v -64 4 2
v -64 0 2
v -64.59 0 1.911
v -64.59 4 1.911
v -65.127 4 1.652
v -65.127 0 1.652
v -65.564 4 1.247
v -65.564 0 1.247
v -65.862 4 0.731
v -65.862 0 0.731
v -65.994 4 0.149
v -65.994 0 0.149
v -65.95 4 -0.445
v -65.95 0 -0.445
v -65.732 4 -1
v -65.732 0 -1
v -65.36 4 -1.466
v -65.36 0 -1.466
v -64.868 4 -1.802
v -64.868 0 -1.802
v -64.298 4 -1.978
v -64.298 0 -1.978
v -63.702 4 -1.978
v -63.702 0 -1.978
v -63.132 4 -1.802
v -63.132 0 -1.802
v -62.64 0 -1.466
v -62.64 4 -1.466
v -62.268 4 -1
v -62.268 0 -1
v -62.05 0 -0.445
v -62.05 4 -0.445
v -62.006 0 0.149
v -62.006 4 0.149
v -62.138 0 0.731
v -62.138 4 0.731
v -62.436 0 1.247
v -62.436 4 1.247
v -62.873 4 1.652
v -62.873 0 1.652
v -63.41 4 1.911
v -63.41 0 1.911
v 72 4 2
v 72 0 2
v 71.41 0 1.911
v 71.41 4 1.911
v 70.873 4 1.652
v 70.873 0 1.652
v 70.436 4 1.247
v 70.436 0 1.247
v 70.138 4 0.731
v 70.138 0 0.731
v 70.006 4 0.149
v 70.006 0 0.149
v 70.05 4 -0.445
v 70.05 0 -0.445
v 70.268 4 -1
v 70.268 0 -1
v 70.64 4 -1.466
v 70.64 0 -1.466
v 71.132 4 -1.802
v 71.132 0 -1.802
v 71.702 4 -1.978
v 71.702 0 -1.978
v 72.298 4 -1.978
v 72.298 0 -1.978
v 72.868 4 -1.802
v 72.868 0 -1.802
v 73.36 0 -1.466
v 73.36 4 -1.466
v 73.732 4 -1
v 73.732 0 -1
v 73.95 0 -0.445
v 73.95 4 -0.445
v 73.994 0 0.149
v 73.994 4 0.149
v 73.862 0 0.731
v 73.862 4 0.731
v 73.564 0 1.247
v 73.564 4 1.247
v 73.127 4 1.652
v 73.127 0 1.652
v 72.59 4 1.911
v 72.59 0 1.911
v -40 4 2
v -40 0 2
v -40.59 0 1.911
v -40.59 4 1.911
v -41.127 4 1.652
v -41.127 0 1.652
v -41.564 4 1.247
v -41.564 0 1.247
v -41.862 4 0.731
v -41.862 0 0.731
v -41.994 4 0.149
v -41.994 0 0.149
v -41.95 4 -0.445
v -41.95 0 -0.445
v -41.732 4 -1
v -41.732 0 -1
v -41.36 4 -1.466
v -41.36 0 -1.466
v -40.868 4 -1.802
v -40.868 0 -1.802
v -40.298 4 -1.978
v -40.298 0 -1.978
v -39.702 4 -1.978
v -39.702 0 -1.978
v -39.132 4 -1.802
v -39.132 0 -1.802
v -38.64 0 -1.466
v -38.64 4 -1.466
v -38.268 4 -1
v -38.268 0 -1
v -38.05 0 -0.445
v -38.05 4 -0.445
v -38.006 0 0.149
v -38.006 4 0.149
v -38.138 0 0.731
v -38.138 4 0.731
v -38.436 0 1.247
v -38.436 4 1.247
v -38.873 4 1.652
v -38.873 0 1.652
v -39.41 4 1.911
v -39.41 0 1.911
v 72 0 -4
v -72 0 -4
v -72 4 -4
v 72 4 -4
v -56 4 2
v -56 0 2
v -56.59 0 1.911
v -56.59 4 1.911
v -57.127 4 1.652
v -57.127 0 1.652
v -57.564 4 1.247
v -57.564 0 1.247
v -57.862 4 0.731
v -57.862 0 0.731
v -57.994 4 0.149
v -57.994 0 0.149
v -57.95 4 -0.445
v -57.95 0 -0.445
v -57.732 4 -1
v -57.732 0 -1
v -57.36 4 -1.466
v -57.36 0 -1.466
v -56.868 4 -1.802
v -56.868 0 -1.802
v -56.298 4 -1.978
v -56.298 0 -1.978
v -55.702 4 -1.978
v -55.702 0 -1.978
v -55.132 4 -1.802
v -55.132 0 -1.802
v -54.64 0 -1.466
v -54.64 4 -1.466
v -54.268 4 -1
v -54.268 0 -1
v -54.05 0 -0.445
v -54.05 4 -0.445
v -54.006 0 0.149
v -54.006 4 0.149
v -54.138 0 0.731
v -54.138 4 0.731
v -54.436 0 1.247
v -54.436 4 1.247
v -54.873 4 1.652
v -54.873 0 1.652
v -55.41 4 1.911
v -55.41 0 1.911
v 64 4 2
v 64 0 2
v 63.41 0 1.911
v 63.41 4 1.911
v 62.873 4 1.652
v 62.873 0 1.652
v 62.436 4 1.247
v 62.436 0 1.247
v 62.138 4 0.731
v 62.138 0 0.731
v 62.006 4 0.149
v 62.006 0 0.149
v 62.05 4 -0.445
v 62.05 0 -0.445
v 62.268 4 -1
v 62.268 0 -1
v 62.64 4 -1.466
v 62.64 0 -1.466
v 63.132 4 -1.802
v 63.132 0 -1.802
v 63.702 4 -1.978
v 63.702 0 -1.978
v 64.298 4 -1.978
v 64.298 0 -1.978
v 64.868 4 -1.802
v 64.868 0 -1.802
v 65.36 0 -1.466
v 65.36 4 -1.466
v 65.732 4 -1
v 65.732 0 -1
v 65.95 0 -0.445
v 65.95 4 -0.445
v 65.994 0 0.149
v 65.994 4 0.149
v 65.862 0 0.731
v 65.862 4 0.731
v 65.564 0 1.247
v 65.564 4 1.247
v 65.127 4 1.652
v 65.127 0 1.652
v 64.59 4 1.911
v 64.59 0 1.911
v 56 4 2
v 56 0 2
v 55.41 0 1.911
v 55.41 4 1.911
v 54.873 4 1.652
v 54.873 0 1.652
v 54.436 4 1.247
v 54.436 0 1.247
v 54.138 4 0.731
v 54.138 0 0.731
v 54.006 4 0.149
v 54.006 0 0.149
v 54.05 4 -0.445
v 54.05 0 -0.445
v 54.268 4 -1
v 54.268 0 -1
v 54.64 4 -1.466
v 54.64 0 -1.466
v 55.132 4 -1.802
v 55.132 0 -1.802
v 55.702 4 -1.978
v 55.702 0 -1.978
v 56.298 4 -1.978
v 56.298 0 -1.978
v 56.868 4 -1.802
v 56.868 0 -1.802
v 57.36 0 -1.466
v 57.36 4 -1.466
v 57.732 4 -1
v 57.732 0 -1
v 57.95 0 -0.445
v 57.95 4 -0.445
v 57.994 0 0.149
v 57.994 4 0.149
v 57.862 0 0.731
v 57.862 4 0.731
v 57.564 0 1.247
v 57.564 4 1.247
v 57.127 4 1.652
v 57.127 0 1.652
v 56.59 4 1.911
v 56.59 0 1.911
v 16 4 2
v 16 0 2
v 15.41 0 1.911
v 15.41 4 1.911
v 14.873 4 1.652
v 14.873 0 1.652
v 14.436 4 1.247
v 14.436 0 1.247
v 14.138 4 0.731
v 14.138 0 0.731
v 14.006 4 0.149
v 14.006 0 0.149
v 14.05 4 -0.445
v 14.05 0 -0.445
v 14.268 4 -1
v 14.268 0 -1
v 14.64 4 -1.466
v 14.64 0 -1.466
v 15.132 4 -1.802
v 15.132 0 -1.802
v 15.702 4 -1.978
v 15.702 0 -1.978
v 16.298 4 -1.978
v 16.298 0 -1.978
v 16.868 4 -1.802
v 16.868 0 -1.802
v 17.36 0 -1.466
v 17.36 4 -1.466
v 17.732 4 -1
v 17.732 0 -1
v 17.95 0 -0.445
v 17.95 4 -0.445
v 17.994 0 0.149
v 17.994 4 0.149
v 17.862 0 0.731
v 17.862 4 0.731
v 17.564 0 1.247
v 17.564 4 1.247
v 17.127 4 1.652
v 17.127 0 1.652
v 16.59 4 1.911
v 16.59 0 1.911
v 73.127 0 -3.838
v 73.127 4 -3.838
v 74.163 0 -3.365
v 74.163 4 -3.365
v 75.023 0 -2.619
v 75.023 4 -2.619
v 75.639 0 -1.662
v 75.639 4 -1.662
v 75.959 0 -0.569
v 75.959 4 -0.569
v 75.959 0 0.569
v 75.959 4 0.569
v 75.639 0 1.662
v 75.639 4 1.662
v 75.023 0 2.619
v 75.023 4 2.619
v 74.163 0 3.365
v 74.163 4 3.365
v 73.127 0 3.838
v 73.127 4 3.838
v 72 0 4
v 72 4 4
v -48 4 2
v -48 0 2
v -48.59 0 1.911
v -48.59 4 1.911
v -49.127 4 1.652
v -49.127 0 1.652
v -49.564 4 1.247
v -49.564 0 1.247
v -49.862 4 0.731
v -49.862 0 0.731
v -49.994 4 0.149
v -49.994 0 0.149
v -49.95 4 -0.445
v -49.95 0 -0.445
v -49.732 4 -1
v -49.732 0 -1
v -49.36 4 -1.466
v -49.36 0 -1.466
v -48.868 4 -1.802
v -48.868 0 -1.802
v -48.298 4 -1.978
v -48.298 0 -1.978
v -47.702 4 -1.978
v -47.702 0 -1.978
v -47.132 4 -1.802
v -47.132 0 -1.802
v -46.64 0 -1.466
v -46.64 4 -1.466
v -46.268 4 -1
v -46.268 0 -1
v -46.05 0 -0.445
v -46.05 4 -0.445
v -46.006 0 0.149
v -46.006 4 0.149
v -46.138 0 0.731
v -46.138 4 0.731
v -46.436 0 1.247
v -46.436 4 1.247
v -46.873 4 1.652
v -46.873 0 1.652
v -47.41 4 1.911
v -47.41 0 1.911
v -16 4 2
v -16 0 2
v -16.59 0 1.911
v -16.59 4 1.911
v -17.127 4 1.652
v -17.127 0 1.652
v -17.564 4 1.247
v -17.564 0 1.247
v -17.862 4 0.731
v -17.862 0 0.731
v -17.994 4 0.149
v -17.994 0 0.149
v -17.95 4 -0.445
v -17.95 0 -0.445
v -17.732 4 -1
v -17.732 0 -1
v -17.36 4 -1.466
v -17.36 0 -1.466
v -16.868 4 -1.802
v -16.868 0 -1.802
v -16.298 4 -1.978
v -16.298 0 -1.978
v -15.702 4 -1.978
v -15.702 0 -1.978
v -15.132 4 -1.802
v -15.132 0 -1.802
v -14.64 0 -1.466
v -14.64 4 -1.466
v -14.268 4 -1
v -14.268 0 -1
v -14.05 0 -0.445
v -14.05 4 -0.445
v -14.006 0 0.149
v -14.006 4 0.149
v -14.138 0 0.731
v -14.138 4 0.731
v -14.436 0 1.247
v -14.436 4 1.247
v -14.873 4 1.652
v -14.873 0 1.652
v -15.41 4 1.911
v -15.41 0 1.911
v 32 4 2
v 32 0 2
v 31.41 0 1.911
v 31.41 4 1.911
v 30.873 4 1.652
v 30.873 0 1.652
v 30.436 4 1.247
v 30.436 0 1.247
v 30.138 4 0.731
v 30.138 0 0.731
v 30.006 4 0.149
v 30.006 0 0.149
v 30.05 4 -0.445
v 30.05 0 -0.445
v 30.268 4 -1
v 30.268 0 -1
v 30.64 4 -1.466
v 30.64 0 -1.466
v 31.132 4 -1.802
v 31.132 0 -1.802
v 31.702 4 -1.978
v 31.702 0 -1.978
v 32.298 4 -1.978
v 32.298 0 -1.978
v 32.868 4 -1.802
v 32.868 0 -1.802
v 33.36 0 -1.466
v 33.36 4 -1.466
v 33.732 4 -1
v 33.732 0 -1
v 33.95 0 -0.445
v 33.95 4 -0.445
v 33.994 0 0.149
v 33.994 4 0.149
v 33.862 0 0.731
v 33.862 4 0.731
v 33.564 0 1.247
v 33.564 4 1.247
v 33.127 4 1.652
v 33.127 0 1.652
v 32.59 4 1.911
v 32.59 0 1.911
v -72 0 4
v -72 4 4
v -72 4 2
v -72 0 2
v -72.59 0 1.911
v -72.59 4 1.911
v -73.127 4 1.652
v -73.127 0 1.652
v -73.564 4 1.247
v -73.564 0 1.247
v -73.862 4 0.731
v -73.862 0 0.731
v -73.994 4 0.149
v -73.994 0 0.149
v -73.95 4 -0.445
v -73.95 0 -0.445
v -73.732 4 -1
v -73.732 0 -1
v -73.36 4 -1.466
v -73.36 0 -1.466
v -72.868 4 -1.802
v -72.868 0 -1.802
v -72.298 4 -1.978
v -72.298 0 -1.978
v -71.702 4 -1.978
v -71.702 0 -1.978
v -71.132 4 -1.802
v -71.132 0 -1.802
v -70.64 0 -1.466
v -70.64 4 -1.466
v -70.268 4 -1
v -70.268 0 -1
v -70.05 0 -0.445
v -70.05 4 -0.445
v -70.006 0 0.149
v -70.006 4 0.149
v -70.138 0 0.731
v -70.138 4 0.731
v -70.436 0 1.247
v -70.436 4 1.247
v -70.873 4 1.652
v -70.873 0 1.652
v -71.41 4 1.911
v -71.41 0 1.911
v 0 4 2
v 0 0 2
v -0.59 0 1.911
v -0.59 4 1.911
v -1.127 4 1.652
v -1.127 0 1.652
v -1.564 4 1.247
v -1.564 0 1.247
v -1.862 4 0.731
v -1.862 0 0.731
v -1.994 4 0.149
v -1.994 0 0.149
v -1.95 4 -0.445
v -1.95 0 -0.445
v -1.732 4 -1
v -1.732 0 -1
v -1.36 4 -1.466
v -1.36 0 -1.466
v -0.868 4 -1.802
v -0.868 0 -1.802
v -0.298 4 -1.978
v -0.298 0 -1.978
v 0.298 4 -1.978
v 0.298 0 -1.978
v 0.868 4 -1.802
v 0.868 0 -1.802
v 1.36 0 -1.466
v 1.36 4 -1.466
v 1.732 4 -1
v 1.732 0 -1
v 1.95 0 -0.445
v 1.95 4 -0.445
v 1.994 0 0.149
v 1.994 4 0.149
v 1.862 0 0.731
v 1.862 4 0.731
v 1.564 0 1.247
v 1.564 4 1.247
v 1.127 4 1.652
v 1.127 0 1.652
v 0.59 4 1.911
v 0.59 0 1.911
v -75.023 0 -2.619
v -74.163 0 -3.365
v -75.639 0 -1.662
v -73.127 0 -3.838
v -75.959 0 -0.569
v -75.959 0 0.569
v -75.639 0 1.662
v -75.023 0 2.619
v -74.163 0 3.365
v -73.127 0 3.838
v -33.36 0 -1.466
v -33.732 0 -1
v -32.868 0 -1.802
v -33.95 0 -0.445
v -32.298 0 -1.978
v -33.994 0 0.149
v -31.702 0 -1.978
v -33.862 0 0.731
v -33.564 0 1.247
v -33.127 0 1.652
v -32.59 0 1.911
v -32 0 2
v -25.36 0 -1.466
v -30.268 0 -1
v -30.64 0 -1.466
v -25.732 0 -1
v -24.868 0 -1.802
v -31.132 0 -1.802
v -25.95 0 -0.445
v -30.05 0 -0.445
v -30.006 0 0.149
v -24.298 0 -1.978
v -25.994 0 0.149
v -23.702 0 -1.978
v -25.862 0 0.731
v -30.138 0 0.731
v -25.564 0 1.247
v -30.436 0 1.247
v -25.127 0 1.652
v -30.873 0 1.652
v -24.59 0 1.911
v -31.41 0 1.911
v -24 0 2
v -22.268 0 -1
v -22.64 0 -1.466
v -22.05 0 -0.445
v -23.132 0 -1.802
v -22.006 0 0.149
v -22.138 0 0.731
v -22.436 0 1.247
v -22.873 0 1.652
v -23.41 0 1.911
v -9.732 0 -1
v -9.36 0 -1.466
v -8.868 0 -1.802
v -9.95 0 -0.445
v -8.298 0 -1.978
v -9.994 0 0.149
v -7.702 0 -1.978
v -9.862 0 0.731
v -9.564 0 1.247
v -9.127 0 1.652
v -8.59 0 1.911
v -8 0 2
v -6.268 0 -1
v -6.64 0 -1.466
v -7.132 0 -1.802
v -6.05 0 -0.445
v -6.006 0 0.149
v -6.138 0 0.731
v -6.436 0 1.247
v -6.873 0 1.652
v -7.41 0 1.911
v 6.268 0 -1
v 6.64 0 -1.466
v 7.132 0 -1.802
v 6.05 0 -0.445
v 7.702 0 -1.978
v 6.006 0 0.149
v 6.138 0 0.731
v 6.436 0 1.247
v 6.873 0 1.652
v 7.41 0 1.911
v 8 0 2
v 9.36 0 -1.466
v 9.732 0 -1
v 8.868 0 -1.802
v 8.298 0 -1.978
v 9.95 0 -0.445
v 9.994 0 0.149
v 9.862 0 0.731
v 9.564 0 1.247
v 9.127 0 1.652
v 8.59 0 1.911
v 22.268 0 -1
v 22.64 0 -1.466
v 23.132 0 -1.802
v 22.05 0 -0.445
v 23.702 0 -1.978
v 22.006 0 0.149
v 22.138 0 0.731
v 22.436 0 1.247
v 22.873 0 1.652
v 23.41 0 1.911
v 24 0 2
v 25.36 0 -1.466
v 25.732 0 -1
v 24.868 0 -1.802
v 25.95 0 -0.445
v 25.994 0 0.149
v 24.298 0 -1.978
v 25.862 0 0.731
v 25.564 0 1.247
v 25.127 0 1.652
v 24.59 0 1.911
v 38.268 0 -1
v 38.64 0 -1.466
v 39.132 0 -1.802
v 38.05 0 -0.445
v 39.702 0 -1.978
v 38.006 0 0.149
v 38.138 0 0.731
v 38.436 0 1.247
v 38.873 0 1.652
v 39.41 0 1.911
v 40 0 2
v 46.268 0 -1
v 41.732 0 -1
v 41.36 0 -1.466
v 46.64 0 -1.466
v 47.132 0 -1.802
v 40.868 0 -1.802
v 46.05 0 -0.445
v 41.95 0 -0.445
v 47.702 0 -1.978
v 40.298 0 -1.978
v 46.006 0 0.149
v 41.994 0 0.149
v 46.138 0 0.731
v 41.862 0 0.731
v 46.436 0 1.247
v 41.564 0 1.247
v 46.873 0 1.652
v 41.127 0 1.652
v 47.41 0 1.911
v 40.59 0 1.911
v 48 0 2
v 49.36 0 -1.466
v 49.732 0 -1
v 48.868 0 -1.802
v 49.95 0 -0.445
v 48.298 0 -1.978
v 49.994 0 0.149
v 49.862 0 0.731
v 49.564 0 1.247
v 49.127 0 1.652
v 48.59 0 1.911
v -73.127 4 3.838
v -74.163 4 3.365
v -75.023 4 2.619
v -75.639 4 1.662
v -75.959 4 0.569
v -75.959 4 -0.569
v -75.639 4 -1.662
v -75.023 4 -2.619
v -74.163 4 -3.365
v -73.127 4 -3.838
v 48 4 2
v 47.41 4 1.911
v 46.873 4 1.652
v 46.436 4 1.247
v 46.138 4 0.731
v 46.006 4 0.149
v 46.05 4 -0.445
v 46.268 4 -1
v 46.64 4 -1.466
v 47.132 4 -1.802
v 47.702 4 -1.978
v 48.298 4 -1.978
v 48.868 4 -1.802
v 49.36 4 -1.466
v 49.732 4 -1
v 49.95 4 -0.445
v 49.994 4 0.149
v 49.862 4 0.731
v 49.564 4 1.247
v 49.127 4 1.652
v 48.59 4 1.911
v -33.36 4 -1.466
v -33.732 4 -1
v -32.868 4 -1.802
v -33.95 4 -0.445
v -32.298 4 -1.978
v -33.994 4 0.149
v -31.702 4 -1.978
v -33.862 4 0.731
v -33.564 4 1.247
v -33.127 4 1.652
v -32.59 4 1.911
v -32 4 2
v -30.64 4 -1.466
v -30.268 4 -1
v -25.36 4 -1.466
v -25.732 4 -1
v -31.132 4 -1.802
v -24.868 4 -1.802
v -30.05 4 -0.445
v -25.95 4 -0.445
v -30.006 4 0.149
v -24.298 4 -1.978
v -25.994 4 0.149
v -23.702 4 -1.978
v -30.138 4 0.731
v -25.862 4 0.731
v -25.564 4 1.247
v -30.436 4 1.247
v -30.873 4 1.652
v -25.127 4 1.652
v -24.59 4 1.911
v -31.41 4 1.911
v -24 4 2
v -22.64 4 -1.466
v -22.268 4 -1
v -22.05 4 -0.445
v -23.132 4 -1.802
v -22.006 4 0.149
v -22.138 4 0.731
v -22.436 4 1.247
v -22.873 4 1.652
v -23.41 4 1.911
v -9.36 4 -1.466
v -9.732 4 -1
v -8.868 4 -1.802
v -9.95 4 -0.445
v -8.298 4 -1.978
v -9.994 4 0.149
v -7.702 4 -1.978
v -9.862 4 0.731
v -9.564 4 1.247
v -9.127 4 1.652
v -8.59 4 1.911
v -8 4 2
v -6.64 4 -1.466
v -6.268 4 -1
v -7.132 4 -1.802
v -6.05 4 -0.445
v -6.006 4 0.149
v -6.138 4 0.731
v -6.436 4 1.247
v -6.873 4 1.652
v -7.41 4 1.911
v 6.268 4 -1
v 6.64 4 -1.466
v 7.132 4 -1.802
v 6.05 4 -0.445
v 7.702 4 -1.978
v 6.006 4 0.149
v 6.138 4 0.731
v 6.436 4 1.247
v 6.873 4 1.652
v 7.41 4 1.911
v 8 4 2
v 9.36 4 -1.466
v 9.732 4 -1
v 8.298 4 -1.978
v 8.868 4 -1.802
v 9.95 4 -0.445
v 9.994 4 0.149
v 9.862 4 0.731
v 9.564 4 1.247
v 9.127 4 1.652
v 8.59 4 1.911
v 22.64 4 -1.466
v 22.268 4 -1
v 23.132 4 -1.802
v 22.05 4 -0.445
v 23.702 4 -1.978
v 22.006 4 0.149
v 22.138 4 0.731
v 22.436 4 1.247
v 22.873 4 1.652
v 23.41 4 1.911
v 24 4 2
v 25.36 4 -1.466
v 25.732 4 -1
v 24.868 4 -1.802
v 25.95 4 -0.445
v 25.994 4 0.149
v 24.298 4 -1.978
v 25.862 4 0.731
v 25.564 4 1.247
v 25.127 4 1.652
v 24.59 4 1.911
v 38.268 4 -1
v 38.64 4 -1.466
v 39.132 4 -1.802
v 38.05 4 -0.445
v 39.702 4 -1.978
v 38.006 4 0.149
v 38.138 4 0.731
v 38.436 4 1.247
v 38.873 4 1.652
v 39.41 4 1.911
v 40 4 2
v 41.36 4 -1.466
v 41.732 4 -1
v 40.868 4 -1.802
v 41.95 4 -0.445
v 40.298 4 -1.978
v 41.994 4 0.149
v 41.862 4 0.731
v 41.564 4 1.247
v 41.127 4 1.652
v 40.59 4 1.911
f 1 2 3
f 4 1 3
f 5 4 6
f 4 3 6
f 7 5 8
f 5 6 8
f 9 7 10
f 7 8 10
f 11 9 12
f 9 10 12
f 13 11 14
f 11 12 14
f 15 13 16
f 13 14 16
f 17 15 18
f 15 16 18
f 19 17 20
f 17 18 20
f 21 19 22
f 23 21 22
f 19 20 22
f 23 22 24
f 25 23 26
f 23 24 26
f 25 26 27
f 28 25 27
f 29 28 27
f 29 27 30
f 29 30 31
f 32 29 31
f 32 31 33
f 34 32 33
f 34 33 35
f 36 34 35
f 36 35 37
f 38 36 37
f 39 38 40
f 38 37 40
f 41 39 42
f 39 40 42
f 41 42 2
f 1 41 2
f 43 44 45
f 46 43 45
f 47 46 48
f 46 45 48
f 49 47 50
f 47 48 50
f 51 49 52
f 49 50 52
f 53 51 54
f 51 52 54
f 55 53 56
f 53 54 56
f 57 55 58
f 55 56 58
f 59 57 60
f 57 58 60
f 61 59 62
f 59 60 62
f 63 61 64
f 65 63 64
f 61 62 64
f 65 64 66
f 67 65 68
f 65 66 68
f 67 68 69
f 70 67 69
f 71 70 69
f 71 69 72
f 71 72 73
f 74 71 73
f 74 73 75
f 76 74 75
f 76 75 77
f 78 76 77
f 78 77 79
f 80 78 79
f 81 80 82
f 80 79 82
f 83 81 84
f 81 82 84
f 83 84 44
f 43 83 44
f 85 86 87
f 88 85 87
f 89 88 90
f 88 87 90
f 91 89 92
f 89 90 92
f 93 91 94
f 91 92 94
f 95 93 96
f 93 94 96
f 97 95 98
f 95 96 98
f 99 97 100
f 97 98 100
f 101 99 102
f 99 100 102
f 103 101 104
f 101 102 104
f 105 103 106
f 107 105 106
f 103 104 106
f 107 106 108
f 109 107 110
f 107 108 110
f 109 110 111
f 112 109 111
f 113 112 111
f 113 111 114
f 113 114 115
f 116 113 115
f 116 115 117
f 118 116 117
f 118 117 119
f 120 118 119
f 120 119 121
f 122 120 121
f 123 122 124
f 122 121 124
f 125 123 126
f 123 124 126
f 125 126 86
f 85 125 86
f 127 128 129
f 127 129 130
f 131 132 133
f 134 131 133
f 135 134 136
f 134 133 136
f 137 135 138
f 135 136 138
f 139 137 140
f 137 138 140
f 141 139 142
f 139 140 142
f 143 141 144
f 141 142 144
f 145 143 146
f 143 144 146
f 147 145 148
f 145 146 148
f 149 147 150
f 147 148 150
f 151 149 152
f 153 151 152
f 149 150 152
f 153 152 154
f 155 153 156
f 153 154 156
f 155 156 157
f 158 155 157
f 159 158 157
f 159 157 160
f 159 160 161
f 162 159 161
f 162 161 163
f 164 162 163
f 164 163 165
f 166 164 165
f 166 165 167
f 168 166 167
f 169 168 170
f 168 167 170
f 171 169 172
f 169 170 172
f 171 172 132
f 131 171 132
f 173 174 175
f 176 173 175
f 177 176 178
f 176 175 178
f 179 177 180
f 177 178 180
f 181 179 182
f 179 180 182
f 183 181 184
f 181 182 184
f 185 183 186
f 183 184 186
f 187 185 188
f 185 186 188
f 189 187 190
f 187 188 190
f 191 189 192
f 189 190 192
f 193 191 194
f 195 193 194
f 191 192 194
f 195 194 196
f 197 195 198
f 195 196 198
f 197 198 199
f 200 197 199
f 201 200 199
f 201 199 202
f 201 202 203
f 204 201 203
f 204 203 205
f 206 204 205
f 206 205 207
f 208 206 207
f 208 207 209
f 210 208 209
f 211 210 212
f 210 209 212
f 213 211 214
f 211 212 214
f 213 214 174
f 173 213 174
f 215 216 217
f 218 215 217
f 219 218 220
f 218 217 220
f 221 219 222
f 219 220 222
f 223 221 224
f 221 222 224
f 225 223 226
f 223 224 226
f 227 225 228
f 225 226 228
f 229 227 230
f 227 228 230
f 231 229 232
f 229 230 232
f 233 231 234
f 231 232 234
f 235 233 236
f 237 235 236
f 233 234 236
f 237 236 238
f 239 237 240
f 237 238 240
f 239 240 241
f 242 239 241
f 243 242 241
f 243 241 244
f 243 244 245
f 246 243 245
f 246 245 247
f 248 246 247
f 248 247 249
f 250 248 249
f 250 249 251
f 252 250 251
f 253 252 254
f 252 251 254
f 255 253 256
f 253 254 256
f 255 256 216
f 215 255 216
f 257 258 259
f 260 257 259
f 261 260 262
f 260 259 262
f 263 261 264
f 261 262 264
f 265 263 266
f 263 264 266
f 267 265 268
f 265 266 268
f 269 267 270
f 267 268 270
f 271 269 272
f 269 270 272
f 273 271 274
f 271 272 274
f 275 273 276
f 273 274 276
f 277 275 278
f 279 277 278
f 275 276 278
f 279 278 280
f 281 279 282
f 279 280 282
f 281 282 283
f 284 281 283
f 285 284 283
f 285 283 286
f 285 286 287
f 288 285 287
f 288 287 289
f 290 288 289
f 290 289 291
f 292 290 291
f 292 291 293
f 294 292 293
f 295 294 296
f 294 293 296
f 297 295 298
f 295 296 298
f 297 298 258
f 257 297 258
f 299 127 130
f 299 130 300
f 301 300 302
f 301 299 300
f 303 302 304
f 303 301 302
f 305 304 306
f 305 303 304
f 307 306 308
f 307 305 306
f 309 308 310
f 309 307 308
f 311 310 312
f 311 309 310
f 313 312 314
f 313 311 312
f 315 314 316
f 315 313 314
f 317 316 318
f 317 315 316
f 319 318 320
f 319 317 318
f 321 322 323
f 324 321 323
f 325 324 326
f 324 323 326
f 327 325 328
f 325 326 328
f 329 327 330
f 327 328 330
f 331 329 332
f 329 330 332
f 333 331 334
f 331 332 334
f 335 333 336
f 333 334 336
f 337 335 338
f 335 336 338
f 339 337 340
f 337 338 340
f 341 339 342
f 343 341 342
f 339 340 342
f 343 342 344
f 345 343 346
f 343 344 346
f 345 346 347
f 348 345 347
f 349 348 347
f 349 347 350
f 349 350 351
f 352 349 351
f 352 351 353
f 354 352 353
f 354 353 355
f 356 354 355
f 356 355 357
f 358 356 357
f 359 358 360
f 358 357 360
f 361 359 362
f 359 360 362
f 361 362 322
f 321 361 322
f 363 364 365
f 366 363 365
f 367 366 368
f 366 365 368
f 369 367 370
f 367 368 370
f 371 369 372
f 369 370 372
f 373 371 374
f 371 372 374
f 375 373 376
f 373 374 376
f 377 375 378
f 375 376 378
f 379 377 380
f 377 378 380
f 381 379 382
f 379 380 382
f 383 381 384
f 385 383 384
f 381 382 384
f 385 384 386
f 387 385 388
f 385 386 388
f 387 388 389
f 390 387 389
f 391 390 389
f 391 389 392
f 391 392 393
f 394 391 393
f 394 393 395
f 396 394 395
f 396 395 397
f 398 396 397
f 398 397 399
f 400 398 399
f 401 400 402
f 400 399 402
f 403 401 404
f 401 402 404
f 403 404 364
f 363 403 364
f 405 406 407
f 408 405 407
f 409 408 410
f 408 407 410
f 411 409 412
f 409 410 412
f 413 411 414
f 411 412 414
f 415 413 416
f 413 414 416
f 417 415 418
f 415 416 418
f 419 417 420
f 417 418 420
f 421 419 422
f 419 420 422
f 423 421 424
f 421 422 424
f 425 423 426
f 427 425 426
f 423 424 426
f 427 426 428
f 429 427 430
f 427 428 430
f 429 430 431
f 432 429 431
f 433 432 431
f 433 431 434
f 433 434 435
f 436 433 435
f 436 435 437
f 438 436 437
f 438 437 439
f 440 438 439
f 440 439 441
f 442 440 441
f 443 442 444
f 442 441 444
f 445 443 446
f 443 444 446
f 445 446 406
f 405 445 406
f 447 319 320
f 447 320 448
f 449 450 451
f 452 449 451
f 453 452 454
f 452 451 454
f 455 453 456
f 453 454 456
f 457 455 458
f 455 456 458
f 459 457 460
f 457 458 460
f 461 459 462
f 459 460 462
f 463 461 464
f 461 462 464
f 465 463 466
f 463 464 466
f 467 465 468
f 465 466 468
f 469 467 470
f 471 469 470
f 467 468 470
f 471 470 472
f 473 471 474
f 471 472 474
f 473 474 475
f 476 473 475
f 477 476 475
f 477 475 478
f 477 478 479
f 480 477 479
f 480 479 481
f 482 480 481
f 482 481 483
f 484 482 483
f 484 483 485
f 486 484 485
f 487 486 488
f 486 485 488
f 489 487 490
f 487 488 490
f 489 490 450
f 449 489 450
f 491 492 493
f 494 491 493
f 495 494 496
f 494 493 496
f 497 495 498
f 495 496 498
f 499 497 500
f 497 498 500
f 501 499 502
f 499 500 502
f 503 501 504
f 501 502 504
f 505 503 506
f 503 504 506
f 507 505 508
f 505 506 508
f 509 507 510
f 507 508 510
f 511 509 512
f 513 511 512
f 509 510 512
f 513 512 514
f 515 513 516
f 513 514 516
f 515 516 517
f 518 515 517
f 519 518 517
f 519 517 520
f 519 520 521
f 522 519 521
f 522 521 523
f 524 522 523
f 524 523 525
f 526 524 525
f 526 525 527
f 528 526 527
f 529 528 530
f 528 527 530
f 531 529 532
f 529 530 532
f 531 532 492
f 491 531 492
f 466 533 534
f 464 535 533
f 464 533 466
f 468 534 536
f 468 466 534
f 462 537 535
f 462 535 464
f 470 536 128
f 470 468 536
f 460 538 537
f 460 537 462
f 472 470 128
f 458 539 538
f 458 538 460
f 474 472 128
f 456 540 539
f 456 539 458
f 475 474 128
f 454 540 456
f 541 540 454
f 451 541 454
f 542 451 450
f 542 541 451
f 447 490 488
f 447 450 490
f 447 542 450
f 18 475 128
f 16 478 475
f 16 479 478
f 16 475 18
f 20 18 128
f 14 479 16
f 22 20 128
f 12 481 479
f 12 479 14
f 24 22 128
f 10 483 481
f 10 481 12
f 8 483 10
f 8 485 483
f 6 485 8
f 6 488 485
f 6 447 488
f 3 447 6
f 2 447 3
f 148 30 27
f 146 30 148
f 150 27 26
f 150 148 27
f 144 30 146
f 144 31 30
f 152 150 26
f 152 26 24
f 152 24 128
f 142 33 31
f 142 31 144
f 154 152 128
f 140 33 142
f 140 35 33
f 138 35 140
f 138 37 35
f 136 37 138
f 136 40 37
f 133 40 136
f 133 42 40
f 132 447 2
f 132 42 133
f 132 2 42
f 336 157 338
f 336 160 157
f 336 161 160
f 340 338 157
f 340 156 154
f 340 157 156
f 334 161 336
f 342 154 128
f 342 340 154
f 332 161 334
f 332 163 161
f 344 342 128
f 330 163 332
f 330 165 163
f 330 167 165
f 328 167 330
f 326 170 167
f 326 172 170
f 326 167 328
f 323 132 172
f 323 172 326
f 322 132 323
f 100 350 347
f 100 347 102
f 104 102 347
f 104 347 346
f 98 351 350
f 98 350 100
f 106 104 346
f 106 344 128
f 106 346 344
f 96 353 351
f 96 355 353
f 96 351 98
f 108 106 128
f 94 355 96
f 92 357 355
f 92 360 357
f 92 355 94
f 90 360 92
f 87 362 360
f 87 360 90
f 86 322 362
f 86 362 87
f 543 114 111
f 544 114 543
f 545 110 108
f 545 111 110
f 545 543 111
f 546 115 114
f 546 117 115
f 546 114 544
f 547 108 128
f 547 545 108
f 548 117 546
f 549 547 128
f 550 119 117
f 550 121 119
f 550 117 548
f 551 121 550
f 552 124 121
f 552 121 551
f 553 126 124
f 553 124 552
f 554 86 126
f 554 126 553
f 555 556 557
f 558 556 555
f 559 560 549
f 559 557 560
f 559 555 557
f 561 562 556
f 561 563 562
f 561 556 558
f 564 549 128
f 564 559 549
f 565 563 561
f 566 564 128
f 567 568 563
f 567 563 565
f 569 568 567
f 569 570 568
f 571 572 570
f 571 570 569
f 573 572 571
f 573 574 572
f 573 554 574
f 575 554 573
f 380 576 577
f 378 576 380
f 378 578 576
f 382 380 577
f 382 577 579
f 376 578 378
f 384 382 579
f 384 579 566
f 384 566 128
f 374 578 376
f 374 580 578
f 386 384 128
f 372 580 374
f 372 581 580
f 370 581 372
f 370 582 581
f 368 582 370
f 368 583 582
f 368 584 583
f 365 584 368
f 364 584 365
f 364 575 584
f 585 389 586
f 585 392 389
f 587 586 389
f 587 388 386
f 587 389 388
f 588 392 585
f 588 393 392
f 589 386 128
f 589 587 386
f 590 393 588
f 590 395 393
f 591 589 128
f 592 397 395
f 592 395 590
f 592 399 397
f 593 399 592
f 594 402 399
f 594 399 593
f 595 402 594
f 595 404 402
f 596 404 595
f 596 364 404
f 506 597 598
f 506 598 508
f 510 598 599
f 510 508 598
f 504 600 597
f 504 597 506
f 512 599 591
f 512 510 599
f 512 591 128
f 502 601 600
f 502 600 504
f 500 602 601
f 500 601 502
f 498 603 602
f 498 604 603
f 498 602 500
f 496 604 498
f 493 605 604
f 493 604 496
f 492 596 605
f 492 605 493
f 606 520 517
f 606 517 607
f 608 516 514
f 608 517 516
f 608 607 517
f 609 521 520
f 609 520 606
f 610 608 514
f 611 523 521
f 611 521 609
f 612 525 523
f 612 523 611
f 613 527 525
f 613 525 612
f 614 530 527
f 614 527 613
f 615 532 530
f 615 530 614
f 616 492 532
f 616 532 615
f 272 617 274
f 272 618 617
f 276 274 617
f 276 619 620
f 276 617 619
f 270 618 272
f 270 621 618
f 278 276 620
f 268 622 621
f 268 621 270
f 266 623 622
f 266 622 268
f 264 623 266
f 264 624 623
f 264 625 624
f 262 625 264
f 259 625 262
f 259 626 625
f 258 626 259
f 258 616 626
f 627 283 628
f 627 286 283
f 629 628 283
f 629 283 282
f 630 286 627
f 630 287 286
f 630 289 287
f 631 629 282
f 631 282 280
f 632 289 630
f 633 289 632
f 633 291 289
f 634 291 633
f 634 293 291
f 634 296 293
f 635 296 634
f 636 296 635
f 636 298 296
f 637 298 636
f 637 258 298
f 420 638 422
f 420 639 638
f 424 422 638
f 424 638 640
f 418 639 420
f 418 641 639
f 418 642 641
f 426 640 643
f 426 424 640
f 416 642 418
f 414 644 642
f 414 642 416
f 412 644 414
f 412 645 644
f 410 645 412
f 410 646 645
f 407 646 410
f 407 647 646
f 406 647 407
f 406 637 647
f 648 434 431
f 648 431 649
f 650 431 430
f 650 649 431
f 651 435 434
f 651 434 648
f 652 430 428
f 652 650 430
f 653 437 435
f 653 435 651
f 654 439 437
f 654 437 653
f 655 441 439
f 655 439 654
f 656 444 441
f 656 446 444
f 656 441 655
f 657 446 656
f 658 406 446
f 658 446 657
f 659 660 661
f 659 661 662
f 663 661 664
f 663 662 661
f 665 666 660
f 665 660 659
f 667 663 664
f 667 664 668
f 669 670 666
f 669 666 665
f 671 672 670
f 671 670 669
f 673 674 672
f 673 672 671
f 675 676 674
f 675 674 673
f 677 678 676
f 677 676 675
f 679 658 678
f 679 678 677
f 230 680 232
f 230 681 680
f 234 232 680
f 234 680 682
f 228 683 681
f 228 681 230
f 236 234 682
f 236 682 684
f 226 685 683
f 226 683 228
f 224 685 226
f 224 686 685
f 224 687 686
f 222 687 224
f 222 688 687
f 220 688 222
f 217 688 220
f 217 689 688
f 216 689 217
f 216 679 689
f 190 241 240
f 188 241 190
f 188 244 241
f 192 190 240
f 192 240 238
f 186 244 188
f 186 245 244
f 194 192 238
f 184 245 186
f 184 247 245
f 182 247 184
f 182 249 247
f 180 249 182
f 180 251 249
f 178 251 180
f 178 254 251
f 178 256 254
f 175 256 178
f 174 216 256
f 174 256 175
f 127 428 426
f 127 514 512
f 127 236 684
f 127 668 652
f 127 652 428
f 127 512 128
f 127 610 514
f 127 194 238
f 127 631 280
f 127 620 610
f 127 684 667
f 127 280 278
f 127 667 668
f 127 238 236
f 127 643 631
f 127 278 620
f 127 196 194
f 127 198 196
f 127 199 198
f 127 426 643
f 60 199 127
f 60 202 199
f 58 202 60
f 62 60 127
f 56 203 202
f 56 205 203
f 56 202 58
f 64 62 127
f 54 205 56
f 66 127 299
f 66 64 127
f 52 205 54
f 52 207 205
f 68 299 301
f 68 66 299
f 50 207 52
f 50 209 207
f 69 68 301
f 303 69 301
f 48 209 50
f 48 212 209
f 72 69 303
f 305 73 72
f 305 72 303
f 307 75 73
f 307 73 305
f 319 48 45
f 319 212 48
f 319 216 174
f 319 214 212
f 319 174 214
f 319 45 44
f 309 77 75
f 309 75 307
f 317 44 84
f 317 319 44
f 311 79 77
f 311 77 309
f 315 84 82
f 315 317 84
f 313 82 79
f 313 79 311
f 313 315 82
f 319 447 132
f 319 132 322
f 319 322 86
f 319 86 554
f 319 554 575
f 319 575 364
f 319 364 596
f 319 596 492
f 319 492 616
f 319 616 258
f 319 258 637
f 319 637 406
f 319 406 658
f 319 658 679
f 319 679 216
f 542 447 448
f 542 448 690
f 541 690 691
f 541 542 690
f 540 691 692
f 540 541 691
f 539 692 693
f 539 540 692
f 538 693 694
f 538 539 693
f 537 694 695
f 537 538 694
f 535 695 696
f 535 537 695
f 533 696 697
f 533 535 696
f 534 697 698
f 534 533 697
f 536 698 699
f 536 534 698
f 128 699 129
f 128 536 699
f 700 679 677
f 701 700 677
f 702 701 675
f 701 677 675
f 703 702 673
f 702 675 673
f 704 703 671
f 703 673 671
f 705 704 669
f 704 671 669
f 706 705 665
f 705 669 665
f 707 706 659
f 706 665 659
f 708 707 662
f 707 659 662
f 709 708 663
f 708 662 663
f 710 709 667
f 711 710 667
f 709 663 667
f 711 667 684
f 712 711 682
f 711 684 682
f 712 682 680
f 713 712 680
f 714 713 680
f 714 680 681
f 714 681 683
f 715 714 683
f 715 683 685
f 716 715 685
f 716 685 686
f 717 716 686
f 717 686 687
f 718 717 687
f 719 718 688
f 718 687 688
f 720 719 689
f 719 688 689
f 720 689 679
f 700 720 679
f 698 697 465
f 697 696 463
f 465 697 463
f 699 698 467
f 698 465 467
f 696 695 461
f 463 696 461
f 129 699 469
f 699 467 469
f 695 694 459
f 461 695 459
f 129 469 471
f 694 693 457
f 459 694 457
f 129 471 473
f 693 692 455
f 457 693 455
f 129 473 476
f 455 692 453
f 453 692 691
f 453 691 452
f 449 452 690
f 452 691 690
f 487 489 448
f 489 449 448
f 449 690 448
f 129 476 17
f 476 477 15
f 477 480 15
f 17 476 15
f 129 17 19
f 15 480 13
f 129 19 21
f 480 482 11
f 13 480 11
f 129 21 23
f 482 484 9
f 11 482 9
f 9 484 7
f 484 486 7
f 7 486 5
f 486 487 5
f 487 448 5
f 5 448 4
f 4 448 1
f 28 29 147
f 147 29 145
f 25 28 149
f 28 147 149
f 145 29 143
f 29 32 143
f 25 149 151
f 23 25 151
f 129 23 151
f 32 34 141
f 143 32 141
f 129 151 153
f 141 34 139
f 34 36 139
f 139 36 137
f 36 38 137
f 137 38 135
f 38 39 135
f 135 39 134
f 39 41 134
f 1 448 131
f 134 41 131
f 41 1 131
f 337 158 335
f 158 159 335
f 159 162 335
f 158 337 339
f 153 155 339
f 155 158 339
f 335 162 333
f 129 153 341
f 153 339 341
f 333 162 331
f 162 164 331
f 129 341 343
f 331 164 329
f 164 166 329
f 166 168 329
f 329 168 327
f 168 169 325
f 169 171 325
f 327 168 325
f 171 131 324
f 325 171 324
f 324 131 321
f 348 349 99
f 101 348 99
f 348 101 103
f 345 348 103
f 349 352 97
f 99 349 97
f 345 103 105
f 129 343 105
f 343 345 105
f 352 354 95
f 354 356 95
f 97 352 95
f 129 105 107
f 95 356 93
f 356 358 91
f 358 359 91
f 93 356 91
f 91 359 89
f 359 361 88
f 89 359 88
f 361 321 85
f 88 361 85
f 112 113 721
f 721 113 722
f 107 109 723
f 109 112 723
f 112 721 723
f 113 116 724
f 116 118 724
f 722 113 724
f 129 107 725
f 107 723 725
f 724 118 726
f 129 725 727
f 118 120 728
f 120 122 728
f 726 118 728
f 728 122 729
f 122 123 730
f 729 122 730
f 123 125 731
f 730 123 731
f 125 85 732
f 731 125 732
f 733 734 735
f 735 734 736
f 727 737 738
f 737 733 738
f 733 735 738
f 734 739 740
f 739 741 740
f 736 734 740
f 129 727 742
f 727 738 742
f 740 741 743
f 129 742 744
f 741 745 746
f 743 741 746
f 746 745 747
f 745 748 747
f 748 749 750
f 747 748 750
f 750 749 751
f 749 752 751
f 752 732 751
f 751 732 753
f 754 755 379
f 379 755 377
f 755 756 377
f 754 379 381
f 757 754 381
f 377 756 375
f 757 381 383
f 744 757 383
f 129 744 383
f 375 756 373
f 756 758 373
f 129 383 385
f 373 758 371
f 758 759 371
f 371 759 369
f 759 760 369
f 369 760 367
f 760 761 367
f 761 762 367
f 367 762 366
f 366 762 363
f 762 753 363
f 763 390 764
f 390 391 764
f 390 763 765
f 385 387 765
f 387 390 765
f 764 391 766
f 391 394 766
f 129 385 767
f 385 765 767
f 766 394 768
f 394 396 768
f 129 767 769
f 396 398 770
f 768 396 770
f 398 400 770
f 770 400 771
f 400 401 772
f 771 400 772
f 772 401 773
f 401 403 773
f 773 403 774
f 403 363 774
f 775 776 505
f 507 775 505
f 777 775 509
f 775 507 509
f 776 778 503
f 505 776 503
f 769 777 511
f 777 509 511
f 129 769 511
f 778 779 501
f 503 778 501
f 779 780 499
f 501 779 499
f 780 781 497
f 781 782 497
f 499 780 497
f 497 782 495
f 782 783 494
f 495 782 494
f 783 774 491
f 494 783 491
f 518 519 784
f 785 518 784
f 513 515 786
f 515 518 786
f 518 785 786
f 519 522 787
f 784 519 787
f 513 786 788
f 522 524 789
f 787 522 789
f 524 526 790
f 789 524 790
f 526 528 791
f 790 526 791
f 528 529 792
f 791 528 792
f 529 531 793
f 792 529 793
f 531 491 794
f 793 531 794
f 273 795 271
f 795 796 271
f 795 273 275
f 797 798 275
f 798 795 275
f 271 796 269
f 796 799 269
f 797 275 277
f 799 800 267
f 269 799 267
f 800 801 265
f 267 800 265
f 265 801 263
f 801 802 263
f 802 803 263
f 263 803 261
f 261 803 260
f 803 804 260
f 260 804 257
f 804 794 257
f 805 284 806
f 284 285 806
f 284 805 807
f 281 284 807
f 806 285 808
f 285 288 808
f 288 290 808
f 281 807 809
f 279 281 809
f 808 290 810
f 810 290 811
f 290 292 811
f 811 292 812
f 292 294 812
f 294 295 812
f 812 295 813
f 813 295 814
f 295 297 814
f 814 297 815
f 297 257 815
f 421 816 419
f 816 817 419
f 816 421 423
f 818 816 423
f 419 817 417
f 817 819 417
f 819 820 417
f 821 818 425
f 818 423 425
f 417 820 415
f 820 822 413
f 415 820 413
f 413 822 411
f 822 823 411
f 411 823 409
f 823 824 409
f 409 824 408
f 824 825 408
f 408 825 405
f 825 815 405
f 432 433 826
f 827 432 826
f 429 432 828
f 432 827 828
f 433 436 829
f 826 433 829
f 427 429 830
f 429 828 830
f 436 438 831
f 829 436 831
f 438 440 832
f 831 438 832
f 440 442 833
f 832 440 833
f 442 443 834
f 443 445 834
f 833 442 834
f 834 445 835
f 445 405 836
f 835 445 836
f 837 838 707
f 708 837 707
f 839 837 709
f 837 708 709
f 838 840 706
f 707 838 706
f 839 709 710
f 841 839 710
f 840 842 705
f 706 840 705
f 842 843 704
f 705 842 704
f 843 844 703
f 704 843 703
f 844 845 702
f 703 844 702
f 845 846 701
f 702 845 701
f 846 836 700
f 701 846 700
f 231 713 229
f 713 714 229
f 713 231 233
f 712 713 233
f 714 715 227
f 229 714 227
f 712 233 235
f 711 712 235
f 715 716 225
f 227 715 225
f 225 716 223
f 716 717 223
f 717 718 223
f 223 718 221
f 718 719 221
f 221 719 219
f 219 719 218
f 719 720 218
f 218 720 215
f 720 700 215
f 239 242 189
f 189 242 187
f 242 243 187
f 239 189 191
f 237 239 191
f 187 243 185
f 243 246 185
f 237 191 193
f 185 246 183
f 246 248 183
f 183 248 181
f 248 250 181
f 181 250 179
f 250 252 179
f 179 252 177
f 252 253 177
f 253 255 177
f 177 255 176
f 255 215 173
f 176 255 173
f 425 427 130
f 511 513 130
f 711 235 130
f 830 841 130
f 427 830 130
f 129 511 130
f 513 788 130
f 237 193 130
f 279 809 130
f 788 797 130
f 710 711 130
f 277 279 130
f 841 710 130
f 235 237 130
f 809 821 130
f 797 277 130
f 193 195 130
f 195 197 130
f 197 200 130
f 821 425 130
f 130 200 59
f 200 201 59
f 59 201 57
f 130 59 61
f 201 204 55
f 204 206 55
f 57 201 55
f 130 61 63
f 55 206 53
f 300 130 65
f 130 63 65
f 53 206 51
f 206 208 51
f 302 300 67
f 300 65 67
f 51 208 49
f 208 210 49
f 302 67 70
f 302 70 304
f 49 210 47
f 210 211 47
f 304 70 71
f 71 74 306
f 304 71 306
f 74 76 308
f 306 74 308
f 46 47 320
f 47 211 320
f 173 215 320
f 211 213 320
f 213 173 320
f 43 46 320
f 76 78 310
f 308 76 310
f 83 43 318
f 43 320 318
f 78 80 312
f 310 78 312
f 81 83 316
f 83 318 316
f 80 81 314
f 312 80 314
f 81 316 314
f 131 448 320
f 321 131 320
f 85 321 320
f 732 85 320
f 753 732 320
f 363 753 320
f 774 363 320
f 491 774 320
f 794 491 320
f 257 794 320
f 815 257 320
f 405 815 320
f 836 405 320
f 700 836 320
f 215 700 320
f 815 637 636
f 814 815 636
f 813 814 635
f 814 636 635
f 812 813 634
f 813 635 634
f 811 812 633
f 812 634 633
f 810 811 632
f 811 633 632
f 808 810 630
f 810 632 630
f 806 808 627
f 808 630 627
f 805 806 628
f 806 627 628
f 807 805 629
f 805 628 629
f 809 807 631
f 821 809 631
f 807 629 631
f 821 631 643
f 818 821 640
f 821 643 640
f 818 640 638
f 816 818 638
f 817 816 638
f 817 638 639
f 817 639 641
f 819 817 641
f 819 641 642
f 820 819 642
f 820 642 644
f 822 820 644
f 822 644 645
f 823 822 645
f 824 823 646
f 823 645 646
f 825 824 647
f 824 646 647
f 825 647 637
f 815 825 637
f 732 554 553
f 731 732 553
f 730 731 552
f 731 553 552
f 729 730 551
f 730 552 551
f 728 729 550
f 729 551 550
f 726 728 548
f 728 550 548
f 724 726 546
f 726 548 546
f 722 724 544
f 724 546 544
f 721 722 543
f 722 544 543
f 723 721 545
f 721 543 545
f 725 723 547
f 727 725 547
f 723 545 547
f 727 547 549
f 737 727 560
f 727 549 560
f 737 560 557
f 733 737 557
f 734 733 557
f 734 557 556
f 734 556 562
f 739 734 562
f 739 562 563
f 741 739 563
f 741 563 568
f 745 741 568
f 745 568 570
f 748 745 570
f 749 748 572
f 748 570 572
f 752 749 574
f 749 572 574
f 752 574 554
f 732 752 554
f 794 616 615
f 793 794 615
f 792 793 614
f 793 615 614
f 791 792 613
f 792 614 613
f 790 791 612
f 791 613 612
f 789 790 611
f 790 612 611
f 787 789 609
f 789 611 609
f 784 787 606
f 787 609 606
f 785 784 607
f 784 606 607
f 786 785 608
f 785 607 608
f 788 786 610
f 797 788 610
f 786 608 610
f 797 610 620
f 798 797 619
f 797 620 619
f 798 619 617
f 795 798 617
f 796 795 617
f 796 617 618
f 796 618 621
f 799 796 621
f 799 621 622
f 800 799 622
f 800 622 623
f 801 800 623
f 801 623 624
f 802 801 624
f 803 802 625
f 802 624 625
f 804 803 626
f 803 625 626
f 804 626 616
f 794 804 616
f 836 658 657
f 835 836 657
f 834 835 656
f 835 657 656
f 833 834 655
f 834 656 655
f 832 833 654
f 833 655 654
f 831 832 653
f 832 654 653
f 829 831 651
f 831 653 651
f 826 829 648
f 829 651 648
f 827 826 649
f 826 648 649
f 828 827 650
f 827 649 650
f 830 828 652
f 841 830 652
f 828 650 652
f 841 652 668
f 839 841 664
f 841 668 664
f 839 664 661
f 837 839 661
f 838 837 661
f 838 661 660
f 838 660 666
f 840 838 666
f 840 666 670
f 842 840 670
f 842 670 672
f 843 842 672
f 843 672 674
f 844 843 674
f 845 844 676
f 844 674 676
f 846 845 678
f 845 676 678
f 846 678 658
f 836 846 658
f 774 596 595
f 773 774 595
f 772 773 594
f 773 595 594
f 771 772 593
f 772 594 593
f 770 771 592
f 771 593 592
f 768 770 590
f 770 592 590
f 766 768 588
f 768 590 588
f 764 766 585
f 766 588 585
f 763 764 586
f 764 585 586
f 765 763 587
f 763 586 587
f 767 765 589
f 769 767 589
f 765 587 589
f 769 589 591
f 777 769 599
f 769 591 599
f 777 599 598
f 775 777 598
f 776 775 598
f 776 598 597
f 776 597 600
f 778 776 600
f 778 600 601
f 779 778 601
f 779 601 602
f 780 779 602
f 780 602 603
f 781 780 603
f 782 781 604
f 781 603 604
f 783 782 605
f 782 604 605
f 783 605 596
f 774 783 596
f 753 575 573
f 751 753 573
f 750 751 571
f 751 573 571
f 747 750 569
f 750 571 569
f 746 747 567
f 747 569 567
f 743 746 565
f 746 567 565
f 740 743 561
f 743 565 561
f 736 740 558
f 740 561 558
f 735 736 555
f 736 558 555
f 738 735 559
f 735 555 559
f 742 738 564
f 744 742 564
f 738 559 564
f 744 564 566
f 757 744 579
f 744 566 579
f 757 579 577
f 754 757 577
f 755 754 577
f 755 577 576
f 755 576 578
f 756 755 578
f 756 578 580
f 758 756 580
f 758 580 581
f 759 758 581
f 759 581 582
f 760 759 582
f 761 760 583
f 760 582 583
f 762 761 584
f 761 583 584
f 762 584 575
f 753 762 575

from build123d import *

# Parameters (mm, degrees)
SKETCH1_R           = 2
BOSS_EXTRUDE1_DEPTH = 4


with BuildPart() as part:
    # Sketch1 → Boss-Extrude1 (new body)
    with BuildSketch(Plane.XZ):
        with BuildLine():
            Line((-72, -4), (72, -4))
            ThreePointArc((72, -4), (76, 0), (72, 4))
            Line((72, 4), (-72, 4))
            ThreePointArc((-72, 4), (-76, 0), (-72, -4))
        make_face()
        with Locations(Location((-72, 0, 0), (0, 0, 90))):
            Circle(SKETCH1_R, mode=Mode.SUBTRACT)
        with Locations(Location((-64, 0, 0), (0, 0, 90))):
            Circle(SKETCH1_R, mode=Mode.SUBTRACT)
        with Locations(Location((-56, 0, 0), (0, 0, 90))):
            Circle(SKETCH1_R, mode=Mode.SUBTRACT)
        with Locations(Location((-48, 0, 0), (0, 0, 90))):
            Circle(SKETCH1_R, mode=Mode.SUBTRACT)
        with Locations(Location((-40, 0, 0), (0, 0, 90))):
            Circle(SKETCH1_R, mode=Mode.SUBTRACT)
        with Locations(Location((-32, 0, 0), (0, 0, 90))):
            Circle(SKETCH1_R, mode=Mode.SUBTRACT)
        with Locations(Location((-24, 0, 0), (0, 0, 90))):
            Circle(SKETCH1_R, mode=Mode.SUBTRACT)
        with Locations(Location((-16, 0, 0), (0, 0, 90))):
            Circle(SKETCH1_R, mode=Mode.SUBTRACT)
        with Locations(Location((-8, 0, 0), (0, 0, 90))):
            Circle(SKETCH1_R, mode=Mode.SUBTRACT)
        with Locations(Location((0, 0, 0), (0, 0, 90))):
            Circle(SKETCH1_R, mode=Mode.SUBTRACT)
        with Locations(Location((8, 0, 0), (0, 0, 90))):
            Circle(SKETCH1_R, mode=Mode.SUBTRACT)
        with Locations(Location((16, 0, 0), (0, 0, 90))):
            Circle(SKETCH1_R, mode=Mode.SUBTRACT)
        with Locations(Location((24, 0, 0), (0, 0, 90))):
            Circle(SKETCH1_R, mode=Mode.SUBTRACT)
        with Locations(Location((32, 0, 0), (0, 0, 90))):
            Circle(SKETCH1_R, mode=Mode.SUBTRACT)
        with Locations(Location((40, 0, 0), (0, 0, 90))):
            Circle(SKETCH1_R, mode=Mode.SUBTRACT)
        with Locations(Location((48, 0, 0), (0, 0, 90))):
            Circle(SKETCH1_R, mode=Mode.SUBTRACT)
        with Locations(Location((56, 0, 0), (0, 0, 90))):
            Circle(SKETCH1_R, mode=Mode.SUBTRACT)
        with Locations(Location((64, 0, 0), (0, 0, 90))):
            Circle(SKETCH1_R, mode=Mode.SUBTRACT)
        with Locations(Location((72, 0, 0), (0, 0, 90))):
            Circle(SKETCH1_R, mode=Mode.SUBTRACT)
    extrude(amount=-BOSS_EXTRUDE1_DEPTH)


solid = part.part
